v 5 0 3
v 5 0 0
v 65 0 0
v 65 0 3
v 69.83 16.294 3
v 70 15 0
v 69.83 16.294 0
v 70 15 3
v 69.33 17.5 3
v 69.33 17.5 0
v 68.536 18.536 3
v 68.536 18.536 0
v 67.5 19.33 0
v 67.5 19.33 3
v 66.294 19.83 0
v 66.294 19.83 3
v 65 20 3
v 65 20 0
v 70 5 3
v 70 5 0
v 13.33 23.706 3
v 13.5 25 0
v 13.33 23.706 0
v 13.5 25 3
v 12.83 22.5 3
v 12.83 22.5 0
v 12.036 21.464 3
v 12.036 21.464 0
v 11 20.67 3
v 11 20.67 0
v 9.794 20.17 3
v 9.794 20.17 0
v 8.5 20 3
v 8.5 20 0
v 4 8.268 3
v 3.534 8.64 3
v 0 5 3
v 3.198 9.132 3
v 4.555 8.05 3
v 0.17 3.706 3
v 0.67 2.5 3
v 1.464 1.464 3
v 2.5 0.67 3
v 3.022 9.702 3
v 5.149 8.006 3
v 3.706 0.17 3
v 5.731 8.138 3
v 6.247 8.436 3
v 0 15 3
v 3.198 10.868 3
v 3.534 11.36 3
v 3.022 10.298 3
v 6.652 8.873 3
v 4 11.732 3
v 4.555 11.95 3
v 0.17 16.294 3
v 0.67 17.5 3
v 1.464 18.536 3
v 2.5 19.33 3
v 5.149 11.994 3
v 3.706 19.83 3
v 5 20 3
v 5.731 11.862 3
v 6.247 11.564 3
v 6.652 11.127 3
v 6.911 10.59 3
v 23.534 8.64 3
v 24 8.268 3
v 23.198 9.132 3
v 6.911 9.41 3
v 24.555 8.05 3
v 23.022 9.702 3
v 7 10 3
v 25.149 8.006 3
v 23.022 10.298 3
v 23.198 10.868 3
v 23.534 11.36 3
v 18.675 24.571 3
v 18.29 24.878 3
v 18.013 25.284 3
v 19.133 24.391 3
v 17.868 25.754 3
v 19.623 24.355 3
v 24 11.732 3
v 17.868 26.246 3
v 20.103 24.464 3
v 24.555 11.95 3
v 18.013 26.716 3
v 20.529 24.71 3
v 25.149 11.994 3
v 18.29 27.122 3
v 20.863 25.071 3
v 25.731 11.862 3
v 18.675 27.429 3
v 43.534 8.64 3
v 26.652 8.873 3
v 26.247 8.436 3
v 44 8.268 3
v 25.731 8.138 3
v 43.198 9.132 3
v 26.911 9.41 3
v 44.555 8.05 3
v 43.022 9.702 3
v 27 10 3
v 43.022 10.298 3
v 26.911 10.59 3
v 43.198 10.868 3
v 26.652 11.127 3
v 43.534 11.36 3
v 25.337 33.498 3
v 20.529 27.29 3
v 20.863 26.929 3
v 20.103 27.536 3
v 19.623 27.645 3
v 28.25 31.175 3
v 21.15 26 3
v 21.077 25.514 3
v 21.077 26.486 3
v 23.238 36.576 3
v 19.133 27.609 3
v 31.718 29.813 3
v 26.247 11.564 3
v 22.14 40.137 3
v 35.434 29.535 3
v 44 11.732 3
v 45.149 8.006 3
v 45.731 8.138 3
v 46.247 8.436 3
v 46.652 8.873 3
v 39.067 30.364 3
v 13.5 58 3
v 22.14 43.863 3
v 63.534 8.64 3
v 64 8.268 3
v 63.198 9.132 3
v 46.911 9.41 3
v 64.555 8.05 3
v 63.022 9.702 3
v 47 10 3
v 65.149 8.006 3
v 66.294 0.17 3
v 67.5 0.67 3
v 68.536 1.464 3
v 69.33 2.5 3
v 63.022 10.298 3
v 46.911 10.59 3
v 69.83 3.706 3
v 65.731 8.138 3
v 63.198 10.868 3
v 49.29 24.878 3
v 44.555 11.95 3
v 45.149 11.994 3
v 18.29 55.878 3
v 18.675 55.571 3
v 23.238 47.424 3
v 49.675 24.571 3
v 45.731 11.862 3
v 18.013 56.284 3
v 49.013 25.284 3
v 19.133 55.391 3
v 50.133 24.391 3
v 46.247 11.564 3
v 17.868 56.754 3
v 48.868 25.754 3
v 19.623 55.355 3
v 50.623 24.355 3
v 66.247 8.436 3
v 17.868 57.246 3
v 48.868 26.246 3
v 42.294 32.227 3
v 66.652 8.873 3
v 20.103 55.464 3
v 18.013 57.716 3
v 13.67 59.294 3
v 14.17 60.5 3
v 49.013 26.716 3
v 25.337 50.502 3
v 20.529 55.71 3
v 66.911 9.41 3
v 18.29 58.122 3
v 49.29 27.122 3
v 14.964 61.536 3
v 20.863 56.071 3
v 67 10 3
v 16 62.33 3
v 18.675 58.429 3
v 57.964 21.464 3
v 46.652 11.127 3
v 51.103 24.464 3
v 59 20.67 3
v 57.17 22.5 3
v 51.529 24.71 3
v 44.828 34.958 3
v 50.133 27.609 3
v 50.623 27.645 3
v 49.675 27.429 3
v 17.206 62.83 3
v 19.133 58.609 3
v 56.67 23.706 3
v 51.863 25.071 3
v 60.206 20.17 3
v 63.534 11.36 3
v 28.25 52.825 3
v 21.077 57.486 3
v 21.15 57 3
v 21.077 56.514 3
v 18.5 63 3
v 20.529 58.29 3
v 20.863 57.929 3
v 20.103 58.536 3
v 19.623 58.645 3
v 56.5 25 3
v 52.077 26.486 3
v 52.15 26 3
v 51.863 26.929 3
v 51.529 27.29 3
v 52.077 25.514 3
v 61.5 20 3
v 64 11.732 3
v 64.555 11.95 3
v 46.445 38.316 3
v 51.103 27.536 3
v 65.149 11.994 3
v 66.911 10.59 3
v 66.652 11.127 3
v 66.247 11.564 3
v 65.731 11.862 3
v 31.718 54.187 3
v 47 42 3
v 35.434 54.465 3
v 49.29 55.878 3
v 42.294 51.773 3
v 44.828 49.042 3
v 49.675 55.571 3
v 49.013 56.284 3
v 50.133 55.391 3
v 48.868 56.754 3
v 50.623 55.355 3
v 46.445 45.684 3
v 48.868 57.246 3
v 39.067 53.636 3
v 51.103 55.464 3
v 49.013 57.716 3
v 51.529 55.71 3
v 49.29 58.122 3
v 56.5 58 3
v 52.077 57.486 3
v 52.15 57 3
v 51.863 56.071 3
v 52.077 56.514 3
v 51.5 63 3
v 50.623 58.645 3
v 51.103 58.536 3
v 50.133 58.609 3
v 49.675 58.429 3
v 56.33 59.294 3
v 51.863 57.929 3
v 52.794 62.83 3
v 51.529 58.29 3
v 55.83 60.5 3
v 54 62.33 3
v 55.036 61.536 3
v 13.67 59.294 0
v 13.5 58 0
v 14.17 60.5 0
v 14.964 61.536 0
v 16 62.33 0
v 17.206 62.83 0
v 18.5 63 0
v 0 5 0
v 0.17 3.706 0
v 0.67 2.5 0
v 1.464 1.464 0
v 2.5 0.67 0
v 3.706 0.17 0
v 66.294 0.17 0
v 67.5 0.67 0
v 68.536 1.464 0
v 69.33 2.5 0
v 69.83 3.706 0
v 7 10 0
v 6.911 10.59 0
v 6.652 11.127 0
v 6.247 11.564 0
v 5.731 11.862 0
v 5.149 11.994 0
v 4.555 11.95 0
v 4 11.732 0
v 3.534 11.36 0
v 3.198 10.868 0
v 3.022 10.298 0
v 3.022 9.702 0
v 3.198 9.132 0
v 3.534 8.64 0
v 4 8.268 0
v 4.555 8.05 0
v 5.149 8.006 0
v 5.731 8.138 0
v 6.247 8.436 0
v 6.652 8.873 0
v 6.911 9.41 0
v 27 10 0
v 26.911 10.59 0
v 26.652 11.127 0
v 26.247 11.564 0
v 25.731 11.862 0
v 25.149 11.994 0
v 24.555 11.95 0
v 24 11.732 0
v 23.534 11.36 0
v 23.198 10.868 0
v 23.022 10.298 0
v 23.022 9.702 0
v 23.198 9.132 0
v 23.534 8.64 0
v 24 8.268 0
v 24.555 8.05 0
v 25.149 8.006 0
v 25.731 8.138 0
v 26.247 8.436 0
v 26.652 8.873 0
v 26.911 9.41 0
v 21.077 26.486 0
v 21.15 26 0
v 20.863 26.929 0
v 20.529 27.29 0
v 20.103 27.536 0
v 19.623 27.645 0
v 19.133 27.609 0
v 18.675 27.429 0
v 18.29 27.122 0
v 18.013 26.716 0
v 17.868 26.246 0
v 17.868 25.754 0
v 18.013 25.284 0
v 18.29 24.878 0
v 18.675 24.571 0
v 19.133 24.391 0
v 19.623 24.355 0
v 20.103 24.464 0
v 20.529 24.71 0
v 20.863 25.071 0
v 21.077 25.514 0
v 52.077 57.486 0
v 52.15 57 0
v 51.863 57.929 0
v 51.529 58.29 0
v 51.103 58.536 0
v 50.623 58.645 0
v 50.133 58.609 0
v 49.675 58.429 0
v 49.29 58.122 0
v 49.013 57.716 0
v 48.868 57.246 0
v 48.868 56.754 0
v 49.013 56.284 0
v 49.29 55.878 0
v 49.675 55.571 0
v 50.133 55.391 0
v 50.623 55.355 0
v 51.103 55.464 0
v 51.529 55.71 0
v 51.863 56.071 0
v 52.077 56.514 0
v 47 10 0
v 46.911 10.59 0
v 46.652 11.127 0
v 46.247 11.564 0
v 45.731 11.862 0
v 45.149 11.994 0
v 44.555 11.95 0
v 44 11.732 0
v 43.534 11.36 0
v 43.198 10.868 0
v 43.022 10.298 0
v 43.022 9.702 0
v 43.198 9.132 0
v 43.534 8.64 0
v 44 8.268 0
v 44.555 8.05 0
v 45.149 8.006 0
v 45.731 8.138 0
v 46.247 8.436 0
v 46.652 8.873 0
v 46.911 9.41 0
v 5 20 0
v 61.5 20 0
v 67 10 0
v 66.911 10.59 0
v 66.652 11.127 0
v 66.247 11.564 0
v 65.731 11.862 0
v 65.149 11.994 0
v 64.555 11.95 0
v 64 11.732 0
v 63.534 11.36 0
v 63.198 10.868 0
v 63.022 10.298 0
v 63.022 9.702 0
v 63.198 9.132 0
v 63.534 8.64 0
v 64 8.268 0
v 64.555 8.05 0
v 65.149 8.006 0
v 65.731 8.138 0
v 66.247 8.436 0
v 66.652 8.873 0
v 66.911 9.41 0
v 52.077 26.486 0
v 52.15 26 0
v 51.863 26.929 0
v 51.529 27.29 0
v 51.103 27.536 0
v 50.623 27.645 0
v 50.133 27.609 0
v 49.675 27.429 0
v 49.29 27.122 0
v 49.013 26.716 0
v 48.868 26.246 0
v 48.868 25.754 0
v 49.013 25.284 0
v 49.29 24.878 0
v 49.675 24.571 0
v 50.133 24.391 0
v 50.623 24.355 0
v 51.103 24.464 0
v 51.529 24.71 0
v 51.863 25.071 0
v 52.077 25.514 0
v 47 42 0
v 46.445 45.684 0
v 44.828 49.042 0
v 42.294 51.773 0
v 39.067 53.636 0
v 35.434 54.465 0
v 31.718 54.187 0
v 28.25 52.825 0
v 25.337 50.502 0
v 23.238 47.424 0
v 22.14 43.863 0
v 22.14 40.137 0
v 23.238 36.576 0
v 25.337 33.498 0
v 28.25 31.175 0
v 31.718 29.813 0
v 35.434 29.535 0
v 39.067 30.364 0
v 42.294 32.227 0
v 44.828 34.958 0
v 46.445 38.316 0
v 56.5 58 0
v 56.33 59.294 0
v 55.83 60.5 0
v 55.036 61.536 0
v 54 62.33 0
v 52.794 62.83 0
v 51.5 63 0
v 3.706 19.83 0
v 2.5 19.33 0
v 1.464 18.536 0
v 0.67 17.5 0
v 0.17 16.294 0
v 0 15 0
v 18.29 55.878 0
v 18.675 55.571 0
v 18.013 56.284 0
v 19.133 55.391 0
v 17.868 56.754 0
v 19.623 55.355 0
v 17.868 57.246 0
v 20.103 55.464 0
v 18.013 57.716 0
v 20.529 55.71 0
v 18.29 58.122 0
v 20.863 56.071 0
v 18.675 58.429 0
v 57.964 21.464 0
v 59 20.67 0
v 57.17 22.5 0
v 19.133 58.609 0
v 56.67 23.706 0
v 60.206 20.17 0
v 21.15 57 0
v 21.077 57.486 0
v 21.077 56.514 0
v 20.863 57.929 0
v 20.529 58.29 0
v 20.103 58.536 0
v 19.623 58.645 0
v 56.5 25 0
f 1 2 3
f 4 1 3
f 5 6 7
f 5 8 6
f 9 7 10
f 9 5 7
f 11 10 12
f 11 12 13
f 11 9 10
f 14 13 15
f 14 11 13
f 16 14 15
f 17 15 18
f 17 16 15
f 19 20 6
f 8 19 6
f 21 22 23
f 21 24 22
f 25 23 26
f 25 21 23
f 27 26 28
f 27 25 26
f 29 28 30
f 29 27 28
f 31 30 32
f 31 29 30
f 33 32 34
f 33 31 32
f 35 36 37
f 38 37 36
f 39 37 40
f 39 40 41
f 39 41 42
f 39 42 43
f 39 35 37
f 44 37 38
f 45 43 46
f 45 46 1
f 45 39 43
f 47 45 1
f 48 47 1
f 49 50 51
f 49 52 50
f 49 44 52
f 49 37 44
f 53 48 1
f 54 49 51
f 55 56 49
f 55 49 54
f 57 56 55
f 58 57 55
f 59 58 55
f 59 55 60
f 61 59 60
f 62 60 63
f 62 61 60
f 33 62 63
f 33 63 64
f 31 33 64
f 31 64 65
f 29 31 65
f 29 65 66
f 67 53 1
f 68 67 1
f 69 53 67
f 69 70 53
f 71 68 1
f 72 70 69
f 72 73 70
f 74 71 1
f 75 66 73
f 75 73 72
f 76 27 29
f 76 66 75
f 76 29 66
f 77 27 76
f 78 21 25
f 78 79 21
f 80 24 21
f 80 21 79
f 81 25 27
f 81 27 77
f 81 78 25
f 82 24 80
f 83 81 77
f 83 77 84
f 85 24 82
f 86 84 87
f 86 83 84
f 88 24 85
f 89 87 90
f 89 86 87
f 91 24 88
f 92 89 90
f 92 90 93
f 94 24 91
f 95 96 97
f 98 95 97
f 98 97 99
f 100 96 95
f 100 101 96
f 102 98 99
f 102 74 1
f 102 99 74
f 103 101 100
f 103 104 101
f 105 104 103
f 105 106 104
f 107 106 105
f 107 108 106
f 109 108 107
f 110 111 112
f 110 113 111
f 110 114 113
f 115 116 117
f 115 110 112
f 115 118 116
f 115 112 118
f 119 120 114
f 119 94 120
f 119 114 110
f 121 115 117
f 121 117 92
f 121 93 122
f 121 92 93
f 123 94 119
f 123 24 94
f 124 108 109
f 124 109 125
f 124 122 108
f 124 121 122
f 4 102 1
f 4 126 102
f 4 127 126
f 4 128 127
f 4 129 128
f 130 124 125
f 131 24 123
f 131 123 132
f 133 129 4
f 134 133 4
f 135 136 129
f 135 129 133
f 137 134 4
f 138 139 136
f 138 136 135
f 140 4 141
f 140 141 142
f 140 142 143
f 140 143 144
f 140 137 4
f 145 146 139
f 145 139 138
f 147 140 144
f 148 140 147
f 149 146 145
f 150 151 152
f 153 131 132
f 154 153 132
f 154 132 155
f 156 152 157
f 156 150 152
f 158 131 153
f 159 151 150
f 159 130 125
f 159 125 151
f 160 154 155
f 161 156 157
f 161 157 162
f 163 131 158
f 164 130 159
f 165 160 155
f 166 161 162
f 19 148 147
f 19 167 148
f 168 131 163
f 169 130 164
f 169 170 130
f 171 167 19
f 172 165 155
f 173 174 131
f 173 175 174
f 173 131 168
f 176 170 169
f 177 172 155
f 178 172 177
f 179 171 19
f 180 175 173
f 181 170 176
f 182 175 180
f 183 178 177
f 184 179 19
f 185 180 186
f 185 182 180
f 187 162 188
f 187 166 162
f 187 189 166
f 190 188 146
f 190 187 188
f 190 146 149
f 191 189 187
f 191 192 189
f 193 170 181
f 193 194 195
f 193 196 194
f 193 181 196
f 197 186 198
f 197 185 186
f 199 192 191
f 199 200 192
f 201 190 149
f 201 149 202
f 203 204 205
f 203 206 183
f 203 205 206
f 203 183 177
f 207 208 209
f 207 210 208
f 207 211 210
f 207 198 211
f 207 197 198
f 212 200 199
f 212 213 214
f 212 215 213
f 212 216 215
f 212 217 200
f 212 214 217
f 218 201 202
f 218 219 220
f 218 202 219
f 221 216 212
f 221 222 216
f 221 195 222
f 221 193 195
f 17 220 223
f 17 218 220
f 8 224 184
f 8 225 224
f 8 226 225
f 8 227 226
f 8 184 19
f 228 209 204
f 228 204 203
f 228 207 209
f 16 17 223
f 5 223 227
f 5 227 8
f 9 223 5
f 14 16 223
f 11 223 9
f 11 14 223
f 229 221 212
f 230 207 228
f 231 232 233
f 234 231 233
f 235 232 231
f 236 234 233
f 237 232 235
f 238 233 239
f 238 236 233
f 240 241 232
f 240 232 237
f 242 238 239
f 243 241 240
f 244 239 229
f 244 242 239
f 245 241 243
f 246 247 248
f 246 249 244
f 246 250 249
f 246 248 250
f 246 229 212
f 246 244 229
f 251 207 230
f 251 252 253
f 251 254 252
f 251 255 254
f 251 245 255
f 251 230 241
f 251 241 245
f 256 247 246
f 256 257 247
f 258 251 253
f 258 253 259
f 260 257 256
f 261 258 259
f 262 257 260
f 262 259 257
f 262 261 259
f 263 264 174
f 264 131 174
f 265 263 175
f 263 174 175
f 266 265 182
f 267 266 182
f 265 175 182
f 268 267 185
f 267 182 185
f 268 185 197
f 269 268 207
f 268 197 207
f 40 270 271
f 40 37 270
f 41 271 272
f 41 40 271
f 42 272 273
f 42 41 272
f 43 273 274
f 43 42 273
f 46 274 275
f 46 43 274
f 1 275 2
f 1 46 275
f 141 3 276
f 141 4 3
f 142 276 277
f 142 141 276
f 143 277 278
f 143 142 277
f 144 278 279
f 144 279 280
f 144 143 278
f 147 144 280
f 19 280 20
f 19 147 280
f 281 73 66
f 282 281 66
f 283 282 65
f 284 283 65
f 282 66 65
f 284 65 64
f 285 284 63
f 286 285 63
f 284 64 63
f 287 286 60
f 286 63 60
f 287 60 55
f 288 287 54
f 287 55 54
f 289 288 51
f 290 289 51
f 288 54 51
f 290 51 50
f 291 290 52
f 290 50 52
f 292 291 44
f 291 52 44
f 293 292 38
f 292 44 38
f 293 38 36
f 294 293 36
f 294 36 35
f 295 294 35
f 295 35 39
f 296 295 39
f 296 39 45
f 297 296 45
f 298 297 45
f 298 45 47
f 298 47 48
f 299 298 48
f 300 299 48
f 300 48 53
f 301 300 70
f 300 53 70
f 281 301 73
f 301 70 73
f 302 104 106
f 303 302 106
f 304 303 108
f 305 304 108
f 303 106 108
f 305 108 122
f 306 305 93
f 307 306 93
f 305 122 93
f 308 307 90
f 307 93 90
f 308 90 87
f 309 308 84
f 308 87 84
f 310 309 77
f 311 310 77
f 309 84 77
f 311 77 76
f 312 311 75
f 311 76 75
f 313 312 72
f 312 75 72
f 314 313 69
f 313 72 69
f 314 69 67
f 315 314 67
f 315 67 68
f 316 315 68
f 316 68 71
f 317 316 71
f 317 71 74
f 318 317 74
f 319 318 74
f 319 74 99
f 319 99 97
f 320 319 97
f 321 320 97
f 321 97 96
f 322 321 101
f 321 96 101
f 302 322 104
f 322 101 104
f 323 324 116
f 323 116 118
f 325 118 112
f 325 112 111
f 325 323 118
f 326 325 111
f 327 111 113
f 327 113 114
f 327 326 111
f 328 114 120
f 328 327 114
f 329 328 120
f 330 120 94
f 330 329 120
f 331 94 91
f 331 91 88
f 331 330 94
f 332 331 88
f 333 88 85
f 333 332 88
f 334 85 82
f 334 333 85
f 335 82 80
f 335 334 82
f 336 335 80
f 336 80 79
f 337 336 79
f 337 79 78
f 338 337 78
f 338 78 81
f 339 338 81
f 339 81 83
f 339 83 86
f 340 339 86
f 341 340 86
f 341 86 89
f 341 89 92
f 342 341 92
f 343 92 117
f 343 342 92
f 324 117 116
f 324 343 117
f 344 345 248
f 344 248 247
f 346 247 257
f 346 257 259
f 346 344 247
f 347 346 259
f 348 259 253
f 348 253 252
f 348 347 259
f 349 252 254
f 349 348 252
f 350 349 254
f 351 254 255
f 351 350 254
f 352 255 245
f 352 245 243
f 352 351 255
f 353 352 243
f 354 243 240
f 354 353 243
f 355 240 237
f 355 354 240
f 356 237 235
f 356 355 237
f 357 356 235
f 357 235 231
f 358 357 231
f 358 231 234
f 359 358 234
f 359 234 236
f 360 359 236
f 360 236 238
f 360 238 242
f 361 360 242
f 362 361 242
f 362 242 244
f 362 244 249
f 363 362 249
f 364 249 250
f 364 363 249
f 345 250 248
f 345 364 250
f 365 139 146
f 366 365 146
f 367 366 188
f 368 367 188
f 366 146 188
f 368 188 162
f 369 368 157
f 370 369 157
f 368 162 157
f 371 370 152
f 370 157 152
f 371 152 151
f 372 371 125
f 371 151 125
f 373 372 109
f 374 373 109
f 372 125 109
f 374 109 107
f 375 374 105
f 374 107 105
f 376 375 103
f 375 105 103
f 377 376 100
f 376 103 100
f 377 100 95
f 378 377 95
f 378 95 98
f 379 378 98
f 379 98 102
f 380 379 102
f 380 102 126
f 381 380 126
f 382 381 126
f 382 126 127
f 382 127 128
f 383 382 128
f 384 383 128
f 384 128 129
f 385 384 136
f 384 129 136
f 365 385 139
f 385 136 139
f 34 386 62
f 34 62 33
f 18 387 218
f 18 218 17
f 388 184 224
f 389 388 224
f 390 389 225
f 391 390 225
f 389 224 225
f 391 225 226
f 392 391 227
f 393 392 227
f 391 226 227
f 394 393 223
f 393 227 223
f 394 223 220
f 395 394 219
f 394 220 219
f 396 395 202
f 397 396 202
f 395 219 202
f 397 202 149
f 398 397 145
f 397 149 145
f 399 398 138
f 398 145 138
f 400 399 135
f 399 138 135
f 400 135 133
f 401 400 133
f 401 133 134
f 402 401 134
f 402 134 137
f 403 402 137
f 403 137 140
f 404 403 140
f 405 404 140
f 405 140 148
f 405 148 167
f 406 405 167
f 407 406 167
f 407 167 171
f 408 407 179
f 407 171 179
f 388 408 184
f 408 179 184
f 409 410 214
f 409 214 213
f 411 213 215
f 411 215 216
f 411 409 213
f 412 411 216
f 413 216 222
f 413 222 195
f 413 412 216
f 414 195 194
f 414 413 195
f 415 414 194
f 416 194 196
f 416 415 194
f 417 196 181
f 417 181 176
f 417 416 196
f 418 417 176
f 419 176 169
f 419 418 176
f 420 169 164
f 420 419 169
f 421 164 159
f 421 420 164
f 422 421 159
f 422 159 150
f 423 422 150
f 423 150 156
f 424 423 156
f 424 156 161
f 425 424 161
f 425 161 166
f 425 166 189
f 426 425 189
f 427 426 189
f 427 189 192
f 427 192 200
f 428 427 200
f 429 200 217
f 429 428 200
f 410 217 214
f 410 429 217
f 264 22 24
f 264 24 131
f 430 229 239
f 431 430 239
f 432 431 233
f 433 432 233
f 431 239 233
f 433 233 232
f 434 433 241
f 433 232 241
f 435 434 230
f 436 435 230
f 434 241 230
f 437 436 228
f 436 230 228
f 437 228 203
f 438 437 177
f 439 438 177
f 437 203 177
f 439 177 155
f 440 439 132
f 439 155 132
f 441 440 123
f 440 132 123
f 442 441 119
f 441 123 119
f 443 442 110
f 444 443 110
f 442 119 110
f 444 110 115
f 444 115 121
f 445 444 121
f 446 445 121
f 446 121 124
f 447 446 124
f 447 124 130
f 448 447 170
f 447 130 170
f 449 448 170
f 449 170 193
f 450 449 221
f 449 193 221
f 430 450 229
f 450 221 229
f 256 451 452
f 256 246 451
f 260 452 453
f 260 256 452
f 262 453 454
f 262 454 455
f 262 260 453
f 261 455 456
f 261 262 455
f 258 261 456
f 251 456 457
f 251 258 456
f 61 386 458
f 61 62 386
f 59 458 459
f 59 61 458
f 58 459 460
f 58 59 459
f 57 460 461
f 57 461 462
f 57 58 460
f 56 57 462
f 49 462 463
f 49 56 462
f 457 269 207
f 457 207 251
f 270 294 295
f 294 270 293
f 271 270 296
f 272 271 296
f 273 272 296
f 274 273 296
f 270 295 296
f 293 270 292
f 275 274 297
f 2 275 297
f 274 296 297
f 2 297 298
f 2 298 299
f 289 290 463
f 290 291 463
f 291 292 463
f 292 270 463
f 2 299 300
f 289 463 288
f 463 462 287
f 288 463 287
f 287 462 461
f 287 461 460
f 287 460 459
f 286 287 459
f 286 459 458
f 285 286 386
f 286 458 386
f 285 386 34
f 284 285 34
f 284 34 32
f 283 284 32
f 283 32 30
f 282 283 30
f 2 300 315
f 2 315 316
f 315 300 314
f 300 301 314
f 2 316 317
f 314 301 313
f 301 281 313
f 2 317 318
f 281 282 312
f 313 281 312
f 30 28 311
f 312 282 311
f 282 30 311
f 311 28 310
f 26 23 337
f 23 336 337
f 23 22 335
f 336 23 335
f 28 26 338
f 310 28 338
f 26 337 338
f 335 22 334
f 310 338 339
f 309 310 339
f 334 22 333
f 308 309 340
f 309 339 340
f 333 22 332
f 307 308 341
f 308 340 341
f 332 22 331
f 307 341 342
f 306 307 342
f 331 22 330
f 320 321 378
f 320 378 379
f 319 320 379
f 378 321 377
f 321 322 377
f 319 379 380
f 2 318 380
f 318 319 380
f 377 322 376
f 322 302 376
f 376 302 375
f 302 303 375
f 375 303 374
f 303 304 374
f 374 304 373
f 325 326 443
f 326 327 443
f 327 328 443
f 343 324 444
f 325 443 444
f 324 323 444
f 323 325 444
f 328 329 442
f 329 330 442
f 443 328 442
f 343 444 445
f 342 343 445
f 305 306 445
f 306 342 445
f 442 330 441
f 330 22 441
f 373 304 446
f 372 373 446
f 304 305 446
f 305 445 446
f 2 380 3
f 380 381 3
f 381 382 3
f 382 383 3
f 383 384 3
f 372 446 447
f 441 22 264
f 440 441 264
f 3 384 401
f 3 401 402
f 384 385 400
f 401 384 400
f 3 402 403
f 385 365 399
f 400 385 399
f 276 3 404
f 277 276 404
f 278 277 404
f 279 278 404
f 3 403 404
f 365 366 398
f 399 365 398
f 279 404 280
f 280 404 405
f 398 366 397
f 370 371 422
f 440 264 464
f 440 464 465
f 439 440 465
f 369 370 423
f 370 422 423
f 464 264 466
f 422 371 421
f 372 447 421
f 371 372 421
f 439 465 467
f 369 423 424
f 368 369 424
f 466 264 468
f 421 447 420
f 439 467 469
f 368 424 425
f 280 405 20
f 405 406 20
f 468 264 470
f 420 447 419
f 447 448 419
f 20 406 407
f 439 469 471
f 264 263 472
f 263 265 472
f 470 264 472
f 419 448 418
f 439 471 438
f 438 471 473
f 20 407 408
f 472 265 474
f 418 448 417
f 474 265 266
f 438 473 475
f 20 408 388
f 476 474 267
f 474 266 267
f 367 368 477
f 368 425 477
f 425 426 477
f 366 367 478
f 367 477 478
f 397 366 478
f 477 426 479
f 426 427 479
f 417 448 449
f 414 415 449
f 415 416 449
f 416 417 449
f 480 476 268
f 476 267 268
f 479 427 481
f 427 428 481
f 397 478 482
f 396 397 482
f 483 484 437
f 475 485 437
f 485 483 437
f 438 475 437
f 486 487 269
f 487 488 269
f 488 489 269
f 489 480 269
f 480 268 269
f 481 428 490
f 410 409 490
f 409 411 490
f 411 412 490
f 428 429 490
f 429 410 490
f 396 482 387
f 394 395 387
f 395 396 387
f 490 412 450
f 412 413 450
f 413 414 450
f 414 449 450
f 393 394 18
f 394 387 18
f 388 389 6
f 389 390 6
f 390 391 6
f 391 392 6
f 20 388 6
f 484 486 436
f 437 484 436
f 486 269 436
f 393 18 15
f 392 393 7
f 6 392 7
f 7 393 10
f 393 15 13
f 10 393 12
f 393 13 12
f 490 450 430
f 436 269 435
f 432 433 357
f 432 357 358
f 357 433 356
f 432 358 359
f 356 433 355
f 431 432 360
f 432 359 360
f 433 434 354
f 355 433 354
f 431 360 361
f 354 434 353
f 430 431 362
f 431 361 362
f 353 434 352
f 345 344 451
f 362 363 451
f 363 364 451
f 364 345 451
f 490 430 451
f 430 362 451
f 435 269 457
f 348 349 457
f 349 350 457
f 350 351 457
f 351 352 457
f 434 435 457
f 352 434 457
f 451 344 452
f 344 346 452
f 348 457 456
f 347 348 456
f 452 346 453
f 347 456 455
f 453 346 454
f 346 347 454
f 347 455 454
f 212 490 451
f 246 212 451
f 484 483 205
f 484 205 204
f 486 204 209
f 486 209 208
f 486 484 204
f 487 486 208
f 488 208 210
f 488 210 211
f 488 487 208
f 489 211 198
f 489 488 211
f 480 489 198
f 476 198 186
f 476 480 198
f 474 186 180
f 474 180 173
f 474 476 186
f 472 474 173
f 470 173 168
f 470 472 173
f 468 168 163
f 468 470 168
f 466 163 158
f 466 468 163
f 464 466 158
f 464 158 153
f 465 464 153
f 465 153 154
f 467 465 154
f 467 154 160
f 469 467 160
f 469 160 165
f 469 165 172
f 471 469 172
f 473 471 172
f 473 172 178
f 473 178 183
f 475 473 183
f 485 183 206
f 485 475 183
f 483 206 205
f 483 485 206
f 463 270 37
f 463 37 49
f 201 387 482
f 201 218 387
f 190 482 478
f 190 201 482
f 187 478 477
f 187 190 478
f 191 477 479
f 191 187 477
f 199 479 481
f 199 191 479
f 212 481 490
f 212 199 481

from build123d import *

# Parameters (mm, degrees)
SKETCH1_W           = 43
SKETCH1_H           = 43
SKETCH1_R           = 1.65
SKETCH1_W_2         = 70
SKETCH1_H_2         = 20
BOSS_EXTRUDE1_DEPTH = 3
FILLET1_R           = 5
SKETCH2_R           = 2
CUT_EXTRUDE1_DEPTH  = 3
SKETCH3_R           = 12.5
CUT_EXTRUDE2_DEPTH  = 3


with BuildPart() as part:
    # Sketch1 → Boss-Extrude1 (new body)
    with BuildSketch(Plane.XY):
        with Locations((35, 41.5)):
            Rectangle(SKETCH1_W, SKETCH1_H)
        with Locations((19.5, 26)):
            Circle(SKETCH1_R, mode=Mode.SUBTRACT)
        with Locations((50.5, 26)):
            Circle(SKETCH1_R, mode=Mode.SUBTRACT)
        with Locations((19.5, 57)):
            Circle(SKETCH1_R, mode=Mode.SUBTRACT)
        with Locations((50.5, 57)):
            Circle(SKETCH1_R, mode=Mode.SUBTRACT)
        with Locations((35, 10)):
            Rectangle(SKETCH1_W_2, SKETCH1_H_2)
    extrude(amount=BOSS_EXTRUDE1_DEPTH)

    # Fillet1
    fillet1_edges = [part.edges().sort_by_distance(p)[0] for p in [
        (56.5, 20, 1.5),
        (70, 20, 1.5),
        (70, 0, 1.5),
        (0, 0, 1.5),
        (0, 20, 1.5),
        (13.5, 20, 1.5),
        (13.5, 63, 1.5),
        (56.5, 63, 1.5),
    ]]
    fillet(fillet1_edges, radius=FILLET1_R)

    # Sketch2 → Cut-Extrude1 (cut)
    with BuildSketch(Plane.XY.offset(3)):
        with Locations((5, 10)):
            Circle(SKETCH2_R)
        with Locations((25, 10)):
            Circle(SKETCH2_R)
        with Locations((45, 10)):
            Circle(SKETCH2_R)
        with Locations((65, 10)):
            Circle(SKETCH2_R)
    extrude(amount=-CUT_EXTRUDE1_DEPTH, mode=Mode.SUBTRACT)

    # Sketch3 → Cut-Extrude2 (cut)
    with BuildSketch(Plane.XY.offset(3)):
        with Locations((34.5, 42)):
            Circle(SKETCH3_R)
    extrude(amount=-CUT_EXTRUDE2_DEPTH, mode=Mode.SUBTRACT)


solid = part.part
